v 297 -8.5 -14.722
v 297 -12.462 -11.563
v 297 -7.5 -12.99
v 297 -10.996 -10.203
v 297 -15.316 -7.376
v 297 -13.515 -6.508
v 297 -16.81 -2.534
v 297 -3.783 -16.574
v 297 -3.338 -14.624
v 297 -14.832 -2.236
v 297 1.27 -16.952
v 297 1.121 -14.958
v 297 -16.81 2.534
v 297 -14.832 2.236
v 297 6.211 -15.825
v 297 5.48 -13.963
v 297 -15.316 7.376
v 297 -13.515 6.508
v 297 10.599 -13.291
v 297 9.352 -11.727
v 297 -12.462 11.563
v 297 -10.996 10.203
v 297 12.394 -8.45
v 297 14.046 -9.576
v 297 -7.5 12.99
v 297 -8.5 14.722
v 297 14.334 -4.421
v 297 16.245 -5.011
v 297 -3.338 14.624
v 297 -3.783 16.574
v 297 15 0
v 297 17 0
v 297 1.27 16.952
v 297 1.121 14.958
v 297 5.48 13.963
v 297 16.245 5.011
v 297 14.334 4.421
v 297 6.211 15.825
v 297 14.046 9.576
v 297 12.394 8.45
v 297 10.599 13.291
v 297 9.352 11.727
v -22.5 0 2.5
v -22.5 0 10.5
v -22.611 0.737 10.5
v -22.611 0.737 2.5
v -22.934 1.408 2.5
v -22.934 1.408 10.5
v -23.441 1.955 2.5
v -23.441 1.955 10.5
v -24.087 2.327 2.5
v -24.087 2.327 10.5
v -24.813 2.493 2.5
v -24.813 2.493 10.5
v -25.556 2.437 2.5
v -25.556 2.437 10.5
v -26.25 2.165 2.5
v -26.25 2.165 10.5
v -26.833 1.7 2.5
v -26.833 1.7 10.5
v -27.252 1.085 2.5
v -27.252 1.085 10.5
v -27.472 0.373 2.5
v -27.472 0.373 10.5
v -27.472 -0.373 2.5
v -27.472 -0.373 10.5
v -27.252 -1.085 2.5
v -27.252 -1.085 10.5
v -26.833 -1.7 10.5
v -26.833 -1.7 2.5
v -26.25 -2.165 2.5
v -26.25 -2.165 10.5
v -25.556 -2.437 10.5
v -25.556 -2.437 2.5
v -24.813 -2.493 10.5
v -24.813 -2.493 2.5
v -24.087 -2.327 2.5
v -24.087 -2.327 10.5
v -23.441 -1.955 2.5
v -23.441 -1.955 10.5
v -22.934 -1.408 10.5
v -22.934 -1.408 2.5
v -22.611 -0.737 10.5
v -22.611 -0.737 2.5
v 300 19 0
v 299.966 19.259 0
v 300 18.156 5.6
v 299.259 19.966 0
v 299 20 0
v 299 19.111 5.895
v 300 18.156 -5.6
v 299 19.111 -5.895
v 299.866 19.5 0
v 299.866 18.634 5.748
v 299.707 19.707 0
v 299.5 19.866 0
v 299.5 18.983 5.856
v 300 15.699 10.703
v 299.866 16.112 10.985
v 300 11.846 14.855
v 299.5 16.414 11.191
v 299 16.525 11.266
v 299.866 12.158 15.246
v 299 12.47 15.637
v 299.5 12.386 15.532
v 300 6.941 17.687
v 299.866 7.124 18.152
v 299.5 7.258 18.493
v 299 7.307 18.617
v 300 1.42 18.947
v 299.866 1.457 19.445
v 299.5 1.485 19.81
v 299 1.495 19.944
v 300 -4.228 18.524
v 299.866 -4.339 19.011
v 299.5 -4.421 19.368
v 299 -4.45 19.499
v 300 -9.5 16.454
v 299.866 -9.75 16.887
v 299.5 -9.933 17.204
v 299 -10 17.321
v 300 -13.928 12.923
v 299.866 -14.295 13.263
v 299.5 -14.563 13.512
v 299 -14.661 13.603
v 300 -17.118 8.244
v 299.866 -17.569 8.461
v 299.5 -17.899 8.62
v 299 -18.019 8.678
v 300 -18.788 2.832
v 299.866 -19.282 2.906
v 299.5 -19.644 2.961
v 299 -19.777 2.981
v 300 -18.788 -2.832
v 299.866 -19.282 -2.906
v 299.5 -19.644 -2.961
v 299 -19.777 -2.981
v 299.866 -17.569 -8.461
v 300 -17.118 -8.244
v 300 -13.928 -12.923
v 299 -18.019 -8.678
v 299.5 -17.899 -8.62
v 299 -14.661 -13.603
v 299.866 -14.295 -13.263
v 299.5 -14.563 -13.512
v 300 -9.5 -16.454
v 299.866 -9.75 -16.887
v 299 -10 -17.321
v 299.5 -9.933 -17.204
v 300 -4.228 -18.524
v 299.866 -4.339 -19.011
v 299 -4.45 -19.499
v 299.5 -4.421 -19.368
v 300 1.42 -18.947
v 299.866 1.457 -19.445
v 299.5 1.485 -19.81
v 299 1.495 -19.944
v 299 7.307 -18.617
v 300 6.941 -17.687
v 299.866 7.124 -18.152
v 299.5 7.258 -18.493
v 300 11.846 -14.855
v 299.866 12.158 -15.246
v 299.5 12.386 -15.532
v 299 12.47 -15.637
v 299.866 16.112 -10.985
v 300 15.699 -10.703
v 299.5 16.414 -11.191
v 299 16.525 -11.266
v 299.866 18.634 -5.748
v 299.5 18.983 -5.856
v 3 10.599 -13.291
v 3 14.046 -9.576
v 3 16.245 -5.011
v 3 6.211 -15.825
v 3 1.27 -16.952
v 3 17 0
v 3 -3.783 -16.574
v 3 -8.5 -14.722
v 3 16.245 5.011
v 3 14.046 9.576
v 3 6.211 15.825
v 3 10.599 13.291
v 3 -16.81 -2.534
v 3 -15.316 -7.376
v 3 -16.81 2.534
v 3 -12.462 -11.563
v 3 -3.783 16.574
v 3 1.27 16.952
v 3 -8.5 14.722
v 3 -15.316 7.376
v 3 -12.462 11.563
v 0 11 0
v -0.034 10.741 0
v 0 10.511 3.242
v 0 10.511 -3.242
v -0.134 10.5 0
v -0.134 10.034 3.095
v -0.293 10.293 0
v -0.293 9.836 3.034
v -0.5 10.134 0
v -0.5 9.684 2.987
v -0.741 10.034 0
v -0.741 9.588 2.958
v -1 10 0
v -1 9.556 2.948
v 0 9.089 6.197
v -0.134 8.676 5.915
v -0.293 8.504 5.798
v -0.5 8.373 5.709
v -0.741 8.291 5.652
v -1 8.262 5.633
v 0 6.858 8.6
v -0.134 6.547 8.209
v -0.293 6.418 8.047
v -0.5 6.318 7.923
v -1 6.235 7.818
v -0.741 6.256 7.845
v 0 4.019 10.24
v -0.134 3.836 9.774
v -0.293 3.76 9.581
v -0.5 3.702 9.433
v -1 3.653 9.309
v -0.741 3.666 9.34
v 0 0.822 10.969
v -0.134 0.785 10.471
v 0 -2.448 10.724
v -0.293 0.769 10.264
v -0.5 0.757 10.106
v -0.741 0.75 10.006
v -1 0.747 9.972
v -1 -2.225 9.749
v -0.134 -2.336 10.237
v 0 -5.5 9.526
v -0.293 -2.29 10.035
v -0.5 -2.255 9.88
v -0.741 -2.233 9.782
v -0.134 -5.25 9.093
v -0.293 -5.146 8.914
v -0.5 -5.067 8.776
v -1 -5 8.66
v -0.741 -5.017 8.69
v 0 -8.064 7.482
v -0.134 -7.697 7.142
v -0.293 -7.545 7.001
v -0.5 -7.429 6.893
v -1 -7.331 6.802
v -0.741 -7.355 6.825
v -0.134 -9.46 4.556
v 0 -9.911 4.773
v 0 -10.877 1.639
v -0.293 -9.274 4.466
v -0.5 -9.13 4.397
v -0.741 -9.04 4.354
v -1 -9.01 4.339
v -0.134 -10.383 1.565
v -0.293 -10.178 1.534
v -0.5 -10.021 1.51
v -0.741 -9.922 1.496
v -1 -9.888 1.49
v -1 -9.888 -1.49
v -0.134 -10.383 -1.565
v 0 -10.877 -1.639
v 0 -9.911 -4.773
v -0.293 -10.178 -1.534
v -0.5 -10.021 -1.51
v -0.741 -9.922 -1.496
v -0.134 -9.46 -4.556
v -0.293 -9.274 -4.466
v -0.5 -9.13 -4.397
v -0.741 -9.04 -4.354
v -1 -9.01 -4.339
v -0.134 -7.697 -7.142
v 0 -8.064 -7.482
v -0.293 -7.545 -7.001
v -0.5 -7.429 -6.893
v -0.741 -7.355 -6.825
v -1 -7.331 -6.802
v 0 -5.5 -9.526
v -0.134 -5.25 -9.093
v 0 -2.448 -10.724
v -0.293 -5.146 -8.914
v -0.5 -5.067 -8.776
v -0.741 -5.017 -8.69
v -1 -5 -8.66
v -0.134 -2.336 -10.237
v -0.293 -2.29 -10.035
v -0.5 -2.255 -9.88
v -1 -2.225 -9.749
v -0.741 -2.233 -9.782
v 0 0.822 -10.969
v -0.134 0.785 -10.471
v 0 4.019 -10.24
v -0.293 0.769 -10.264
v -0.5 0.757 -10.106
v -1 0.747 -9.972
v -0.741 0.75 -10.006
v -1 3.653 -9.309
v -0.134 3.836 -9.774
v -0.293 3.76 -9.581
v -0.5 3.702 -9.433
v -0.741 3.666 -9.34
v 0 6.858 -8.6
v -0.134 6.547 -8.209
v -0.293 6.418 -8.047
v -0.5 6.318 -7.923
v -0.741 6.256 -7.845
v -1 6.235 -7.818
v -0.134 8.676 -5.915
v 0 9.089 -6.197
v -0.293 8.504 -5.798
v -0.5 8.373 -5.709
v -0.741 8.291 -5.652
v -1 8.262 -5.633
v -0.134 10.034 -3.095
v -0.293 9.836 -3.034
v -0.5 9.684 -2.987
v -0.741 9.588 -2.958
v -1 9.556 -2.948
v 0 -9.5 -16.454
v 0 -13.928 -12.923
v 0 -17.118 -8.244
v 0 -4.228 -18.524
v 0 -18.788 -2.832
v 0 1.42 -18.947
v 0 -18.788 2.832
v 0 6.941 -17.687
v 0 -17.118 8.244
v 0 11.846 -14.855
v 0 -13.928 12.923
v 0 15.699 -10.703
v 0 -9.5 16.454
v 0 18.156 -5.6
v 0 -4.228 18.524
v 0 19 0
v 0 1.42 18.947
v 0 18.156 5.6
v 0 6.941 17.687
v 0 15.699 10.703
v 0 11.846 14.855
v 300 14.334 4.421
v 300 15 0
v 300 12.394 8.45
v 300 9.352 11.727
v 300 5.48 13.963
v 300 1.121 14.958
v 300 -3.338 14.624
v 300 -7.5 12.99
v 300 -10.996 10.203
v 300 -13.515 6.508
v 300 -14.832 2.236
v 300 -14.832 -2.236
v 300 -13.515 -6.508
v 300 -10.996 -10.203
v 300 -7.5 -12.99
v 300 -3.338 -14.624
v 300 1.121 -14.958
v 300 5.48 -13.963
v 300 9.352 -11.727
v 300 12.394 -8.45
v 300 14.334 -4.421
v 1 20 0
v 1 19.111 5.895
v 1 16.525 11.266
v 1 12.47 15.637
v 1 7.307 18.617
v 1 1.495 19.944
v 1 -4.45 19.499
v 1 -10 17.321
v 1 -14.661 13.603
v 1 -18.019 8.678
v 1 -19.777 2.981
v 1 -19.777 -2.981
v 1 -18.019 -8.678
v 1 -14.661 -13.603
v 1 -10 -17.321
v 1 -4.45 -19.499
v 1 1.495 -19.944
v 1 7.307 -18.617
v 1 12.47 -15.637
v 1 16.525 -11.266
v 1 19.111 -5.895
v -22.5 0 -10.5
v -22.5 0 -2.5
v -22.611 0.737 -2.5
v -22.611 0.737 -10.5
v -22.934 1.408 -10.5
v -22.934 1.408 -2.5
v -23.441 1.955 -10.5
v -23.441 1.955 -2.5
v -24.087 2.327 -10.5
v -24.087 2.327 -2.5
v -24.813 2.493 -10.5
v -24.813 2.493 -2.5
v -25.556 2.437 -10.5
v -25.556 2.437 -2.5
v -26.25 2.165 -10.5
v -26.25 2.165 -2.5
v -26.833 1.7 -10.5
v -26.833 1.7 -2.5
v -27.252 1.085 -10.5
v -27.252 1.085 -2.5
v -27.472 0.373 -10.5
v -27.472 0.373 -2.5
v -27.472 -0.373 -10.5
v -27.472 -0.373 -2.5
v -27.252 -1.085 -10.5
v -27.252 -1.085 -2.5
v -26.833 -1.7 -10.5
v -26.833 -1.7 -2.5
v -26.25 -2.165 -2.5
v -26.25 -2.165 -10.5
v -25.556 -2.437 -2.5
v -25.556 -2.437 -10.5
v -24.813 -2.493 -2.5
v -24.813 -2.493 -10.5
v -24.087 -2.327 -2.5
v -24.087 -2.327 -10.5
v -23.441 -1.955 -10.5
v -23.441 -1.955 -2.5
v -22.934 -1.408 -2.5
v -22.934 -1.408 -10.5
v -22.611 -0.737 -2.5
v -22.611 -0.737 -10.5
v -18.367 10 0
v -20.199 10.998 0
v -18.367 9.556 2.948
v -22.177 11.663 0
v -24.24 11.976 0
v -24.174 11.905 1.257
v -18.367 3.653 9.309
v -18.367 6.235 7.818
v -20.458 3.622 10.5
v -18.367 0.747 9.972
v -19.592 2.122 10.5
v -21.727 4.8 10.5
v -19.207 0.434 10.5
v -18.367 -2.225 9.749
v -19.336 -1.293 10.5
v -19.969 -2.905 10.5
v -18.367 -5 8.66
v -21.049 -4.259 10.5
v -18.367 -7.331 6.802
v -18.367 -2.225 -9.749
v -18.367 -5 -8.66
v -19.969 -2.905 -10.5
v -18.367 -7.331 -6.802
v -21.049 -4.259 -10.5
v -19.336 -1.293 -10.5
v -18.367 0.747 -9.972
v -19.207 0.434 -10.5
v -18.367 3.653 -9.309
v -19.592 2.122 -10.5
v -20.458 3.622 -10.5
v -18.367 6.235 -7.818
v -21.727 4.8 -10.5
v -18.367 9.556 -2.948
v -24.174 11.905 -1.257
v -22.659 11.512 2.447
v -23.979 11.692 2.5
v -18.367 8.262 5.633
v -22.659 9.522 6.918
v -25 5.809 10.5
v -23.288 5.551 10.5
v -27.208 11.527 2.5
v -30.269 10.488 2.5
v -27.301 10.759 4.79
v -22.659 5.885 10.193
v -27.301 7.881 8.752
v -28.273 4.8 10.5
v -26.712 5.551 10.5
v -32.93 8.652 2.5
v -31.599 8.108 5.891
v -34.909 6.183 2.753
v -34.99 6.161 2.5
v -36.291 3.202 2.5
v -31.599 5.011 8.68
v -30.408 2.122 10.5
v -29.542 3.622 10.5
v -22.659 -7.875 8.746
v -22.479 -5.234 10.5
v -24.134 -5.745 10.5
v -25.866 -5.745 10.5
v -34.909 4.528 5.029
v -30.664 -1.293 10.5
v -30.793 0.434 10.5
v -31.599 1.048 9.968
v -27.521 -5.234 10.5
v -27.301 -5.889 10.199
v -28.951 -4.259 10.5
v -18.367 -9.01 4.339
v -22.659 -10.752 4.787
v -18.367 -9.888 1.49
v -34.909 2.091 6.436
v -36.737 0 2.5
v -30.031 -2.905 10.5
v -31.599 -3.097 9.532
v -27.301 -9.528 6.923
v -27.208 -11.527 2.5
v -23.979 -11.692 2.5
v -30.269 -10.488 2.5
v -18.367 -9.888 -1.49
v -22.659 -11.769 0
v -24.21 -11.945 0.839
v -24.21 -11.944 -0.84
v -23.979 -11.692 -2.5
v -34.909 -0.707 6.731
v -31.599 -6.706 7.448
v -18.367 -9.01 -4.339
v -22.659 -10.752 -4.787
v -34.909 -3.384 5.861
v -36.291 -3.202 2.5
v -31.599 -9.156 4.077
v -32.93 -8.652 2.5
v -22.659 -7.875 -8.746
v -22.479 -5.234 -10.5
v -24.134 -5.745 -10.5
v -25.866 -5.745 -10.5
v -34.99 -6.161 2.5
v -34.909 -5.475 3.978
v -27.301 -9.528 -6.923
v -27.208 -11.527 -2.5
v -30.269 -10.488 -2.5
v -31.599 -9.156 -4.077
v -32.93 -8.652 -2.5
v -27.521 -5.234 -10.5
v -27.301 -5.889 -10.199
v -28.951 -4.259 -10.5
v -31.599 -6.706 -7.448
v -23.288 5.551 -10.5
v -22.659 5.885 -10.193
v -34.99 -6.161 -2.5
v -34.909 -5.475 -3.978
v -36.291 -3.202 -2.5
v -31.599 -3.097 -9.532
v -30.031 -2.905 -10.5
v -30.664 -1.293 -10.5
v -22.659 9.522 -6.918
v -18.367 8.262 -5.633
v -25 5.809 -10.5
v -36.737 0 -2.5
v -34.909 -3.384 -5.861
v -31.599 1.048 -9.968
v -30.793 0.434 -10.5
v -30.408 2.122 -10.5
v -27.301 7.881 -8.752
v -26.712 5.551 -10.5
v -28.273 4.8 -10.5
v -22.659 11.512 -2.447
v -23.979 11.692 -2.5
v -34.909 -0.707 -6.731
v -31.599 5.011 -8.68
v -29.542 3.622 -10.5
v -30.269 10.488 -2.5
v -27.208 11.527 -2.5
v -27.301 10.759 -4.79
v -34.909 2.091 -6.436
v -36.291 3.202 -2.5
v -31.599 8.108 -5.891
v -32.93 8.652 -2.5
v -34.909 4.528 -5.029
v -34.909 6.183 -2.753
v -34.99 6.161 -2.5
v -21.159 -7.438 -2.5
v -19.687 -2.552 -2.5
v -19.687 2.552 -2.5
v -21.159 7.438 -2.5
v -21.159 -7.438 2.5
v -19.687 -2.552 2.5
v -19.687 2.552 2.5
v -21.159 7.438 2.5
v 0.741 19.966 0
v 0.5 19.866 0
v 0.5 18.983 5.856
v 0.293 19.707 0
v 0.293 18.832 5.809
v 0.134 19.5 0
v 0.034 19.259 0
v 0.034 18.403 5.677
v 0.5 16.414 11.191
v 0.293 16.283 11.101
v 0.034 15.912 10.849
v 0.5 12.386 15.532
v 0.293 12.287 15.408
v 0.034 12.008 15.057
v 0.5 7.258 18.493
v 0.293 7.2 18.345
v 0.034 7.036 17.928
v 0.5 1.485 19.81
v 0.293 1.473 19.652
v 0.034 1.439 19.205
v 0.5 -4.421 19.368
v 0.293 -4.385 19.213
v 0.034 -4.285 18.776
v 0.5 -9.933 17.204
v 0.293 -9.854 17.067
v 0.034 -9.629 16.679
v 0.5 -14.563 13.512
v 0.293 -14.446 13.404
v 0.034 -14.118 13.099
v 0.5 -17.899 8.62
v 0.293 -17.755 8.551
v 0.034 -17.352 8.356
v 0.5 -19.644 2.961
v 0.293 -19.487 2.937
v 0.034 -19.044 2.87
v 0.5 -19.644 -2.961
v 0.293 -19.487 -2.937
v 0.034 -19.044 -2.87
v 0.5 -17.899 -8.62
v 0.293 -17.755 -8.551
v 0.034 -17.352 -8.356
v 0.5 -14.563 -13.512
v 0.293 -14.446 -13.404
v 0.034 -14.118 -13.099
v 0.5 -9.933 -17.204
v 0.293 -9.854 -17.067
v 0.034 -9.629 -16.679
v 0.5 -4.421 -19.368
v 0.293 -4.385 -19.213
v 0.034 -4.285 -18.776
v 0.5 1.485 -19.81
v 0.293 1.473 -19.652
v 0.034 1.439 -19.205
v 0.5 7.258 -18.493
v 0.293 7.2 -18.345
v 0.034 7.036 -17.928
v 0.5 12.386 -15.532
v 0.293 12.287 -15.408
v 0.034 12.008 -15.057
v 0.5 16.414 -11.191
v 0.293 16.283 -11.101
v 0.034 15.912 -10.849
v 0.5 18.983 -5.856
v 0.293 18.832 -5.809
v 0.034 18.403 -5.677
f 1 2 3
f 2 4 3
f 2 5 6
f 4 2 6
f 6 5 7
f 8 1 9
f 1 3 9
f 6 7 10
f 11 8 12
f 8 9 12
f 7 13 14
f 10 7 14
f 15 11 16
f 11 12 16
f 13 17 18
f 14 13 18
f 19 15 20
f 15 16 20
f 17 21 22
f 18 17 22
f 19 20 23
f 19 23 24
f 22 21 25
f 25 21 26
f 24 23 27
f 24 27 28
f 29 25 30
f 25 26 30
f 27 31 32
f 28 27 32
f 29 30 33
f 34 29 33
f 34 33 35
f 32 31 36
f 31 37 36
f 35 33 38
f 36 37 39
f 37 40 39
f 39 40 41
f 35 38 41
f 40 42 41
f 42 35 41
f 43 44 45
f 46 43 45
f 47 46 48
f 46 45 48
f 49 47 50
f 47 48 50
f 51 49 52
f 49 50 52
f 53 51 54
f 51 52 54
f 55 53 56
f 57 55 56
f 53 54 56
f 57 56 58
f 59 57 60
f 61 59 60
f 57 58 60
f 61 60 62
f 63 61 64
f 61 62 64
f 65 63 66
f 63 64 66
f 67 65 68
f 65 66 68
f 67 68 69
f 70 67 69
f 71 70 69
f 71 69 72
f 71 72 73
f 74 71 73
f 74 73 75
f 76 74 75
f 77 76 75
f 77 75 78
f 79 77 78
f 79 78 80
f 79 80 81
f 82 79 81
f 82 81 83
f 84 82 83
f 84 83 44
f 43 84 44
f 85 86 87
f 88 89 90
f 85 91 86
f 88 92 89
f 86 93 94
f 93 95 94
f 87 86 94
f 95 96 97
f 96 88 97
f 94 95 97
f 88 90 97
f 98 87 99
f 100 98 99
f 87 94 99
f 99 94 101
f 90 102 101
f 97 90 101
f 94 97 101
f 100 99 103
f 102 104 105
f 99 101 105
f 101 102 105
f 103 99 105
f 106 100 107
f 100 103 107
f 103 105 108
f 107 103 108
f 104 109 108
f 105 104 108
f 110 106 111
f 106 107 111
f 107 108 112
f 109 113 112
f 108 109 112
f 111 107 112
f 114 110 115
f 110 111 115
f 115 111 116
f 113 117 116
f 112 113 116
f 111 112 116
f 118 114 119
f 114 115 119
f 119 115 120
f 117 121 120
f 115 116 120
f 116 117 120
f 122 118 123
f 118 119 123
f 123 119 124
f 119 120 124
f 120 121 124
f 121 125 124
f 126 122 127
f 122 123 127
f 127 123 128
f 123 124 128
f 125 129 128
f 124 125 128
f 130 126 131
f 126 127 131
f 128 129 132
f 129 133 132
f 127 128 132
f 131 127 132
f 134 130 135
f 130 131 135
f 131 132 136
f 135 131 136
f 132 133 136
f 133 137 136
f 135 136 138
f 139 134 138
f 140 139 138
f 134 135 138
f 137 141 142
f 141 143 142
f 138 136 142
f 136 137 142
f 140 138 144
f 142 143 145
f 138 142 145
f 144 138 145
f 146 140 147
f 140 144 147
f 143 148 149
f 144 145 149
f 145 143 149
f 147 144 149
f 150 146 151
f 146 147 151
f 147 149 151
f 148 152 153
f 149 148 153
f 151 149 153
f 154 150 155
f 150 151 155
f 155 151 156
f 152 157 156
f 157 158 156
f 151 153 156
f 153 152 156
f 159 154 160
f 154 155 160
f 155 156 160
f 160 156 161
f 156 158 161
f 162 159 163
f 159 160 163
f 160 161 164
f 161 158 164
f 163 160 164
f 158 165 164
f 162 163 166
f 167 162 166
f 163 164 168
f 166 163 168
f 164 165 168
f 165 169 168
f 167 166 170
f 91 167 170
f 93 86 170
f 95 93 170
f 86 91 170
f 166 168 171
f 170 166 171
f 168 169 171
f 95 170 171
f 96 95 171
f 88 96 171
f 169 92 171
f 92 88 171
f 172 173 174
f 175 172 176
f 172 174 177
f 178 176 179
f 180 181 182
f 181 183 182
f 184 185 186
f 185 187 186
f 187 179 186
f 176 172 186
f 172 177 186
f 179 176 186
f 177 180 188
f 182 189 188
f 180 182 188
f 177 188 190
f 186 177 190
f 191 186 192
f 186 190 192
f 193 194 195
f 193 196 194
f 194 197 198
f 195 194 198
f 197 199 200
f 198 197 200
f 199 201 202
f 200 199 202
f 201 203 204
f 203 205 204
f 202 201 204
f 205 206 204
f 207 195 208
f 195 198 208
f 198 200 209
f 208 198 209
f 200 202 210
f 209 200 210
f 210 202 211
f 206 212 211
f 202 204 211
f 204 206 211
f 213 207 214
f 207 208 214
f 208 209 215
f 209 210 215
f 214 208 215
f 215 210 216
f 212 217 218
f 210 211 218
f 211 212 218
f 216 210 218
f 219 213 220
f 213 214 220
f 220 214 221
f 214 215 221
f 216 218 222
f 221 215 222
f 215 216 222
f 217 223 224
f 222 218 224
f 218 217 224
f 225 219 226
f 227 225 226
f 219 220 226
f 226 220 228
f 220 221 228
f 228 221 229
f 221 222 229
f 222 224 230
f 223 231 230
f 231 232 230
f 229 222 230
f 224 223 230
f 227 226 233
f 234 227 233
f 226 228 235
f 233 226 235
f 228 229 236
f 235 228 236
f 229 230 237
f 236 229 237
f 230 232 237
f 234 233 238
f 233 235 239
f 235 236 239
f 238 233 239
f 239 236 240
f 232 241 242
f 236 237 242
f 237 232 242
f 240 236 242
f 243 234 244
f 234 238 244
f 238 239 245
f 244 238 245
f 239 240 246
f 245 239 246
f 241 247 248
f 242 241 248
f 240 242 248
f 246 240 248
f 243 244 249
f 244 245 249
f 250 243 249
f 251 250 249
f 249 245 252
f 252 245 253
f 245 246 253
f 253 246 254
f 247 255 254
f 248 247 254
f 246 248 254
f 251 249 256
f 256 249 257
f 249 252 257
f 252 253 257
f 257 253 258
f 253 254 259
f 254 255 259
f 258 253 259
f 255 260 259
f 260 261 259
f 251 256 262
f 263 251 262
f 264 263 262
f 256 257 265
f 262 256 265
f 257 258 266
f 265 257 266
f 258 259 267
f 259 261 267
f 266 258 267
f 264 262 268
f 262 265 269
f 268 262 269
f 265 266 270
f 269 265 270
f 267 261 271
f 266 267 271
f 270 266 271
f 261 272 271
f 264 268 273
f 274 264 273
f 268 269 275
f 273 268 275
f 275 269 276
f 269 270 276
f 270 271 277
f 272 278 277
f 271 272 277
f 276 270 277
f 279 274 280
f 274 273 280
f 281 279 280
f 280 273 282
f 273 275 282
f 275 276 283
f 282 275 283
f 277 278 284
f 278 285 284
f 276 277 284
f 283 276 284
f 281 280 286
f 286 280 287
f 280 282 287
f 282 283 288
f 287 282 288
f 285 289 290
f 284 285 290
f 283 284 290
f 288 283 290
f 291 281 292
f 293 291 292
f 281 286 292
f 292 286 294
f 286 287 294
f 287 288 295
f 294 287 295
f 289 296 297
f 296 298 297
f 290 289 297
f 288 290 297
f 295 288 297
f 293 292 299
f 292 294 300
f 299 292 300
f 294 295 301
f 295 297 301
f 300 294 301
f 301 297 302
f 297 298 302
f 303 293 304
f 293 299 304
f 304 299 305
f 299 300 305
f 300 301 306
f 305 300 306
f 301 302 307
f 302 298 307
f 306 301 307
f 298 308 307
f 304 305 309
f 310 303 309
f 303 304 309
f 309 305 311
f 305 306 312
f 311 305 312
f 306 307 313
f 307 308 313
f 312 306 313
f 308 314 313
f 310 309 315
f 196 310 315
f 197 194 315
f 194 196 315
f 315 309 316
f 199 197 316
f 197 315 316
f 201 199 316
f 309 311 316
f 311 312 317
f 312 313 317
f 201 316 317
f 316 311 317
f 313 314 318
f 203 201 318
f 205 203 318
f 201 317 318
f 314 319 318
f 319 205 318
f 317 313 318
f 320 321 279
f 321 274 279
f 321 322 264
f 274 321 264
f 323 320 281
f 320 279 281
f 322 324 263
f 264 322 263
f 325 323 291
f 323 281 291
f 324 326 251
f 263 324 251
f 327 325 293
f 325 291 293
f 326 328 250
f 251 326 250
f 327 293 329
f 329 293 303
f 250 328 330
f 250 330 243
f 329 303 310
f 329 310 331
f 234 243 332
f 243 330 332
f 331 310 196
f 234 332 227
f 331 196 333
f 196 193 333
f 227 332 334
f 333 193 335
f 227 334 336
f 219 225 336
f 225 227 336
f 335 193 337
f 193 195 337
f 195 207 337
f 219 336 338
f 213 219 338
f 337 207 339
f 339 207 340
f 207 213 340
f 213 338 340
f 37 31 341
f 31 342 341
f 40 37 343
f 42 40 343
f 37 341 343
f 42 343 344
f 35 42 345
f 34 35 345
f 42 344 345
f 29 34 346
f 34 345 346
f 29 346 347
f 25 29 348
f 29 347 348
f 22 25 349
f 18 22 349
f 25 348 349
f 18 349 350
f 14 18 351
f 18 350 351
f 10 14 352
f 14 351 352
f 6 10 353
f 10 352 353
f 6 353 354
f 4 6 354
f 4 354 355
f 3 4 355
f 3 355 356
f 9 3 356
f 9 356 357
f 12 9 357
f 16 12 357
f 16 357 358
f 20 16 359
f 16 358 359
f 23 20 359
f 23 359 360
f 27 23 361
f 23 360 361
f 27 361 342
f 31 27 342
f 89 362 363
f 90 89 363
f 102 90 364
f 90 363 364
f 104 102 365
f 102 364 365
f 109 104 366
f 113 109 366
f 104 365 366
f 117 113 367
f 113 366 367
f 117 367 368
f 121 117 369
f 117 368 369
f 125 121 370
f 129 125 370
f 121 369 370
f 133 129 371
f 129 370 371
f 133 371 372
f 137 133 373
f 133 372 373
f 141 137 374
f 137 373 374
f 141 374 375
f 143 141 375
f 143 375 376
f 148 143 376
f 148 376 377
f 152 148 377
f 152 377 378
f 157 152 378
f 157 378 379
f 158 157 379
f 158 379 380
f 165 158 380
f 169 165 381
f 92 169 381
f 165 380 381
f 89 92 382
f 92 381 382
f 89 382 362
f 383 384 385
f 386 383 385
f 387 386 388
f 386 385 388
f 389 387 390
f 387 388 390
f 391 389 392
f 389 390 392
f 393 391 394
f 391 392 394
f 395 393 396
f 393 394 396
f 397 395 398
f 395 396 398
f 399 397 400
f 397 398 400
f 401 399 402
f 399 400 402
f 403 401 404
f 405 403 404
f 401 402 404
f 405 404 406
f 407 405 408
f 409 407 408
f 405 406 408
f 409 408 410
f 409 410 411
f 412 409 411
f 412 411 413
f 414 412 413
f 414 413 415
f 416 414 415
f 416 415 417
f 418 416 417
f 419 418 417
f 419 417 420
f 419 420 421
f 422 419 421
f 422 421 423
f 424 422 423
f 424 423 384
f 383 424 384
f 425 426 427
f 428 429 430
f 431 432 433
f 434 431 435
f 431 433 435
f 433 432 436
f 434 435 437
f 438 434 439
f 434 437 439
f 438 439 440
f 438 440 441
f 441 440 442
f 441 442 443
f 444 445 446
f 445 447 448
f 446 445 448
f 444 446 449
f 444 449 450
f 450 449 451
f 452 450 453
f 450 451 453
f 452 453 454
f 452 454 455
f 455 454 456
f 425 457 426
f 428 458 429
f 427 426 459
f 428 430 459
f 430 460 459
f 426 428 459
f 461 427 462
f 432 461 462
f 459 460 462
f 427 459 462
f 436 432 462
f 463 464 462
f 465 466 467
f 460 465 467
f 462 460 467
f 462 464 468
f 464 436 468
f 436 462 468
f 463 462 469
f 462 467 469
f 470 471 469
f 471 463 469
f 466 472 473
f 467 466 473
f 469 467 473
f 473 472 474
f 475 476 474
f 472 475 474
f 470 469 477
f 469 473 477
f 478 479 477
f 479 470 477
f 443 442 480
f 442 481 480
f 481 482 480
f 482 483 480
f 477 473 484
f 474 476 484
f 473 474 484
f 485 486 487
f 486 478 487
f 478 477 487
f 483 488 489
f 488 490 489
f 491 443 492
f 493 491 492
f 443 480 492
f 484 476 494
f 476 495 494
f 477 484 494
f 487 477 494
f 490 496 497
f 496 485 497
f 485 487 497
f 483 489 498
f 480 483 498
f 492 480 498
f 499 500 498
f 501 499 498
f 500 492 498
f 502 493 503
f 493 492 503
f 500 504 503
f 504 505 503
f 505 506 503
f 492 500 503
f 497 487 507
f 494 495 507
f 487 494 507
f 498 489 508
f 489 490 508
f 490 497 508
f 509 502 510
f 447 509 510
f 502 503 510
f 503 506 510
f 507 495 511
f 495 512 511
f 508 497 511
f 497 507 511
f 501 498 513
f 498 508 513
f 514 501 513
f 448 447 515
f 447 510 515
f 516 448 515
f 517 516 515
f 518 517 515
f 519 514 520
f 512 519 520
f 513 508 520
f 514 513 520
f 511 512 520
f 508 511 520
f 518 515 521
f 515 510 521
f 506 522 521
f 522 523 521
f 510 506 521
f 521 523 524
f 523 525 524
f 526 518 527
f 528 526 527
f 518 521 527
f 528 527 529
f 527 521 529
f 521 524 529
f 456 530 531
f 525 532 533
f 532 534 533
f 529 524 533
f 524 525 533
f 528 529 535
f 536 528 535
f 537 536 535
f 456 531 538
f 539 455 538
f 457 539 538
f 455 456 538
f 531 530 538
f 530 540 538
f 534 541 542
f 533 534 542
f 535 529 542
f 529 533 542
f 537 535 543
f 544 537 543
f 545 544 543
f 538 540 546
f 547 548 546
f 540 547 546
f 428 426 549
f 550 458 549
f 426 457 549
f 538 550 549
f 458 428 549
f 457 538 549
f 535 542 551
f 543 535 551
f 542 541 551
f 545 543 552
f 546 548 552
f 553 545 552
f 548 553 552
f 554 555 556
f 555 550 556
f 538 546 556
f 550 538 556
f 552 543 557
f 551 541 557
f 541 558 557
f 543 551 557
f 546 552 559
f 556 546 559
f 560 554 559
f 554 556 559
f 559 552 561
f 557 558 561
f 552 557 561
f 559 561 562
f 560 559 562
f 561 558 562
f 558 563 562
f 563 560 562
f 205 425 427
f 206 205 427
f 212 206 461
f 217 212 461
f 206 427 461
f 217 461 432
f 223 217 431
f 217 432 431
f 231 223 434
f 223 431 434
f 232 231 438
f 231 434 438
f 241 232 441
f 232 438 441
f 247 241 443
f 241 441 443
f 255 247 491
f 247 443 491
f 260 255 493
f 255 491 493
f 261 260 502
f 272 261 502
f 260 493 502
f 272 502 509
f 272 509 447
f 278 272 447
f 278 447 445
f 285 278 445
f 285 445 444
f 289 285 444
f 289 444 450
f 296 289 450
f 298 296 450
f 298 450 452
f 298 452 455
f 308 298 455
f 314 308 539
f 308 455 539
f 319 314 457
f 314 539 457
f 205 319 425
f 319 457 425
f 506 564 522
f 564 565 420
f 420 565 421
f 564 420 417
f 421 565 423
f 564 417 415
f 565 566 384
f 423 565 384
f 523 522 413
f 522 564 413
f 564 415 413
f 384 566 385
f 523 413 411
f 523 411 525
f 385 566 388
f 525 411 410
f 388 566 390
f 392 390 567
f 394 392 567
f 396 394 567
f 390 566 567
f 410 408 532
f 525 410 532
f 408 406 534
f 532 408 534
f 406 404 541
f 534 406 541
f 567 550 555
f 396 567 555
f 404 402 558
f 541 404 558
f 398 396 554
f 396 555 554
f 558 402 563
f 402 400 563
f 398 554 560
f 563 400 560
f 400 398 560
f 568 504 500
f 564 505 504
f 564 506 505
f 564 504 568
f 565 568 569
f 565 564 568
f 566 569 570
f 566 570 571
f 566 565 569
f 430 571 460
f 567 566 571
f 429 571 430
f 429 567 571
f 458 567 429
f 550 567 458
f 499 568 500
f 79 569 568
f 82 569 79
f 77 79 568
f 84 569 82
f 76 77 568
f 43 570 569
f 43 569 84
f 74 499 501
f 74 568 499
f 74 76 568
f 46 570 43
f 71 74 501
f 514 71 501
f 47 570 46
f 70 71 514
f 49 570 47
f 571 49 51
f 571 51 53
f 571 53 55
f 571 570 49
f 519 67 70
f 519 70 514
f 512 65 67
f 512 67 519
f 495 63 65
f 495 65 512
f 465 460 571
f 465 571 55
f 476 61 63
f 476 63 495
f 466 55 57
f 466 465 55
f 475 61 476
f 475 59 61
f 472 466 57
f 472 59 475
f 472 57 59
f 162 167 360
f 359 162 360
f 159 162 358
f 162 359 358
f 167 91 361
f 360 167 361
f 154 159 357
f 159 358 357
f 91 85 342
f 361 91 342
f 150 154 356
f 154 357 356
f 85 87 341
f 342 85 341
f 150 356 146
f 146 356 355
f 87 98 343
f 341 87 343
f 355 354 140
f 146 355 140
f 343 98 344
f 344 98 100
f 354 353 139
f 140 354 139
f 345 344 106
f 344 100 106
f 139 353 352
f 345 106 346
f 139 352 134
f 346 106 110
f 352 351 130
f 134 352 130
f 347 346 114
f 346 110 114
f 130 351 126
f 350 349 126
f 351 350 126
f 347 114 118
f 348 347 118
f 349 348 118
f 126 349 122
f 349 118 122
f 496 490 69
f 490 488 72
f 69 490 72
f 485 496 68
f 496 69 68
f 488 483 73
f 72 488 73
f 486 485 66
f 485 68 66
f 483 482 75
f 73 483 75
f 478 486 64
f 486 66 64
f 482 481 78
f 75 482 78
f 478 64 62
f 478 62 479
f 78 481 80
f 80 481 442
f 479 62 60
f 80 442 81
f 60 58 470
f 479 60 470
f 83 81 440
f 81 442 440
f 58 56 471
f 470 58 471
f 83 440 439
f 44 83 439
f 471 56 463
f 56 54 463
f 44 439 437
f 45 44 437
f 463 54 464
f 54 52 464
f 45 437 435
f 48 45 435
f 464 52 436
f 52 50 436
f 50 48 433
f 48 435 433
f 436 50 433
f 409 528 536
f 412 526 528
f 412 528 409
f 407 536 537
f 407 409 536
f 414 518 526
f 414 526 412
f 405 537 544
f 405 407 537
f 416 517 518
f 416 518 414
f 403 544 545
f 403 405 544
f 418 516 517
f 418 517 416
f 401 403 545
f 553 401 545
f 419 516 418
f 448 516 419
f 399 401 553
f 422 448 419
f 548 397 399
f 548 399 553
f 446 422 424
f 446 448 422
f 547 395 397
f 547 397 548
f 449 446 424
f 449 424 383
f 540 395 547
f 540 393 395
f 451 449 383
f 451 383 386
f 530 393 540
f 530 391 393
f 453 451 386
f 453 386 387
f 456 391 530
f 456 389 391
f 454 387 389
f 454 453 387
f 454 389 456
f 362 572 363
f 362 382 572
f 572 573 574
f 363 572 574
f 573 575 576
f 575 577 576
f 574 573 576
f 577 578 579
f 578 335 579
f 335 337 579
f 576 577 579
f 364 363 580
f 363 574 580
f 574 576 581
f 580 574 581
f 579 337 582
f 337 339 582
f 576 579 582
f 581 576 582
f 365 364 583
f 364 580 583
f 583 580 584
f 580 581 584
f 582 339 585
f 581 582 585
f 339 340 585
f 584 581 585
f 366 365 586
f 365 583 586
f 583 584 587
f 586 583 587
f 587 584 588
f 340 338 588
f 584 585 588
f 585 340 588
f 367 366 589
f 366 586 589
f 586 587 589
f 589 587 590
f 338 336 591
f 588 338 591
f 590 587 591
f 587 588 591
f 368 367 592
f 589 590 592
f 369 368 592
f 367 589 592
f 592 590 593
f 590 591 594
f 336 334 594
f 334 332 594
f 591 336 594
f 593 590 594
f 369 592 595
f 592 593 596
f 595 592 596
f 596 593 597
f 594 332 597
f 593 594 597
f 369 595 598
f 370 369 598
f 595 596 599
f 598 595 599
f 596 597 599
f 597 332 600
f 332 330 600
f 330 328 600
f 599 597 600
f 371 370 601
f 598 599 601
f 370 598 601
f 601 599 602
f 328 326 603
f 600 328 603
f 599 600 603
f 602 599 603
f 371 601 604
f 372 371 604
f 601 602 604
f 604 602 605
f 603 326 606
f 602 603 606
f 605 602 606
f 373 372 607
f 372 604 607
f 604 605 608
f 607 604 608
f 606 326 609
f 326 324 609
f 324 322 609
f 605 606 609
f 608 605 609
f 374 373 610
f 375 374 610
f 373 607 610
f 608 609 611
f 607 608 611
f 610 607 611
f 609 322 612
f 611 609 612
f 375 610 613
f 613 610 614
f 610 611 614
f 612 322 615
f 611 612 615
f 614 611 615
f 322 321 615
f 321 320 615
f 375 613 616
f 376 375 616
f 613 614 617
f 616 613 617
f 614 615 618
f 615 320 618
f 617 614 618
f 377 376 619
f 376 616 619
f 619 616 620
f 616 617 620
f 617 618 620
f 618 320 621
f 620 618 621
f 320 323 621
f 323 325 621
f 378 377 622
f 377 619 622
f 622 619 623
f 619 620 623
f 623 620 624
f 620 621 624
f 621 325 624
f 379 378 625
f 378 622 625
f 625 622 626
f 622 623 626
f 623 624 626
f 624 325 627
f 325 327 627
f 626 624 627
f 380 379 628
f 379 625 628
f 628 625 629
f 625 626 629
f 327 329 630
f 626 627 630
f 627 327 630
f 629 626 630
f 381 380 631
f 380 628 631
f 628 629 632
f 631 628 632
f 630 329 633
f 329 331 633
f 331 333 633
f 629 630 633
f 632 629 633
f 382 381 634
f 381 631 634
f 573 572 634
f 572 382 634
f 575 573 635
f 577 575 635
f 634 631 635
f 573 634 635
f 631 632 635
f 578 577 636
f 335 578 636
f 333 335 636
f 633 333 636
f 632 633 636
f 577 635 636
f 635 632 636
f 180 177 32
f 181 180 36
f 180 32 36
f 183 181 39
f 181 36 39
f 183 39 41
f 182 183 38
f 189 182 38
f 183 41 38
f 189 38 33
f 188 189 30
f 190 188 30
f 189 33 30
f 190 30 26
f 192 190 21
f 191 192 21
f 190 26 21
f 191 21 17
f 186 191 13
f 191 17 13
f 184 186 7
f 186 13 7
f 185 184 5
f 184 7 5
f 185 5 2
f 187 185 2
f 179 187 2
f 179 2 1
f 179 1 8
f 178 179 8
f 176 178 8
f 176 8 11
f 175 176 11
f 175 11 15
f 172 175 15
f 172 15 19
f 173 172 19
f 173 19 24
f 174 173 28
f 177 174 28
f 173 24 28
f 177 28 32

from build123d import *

# Parameters (mm, degrees)
SKETCH6_OUTSIDE_W       = 110.342
SKETCH6_OUTSIDE_H       = 110.342
SKETCH6_OUTSIDE_W_2     = 21
SKETCH6_OUTSIDE_H_2     = 30
CUT_EXTRUDE3_DEPTH      = 40
SKETCH4_W               = 17.5
SKETCH4_H               = 5
FILLET1_R               = 1
SKETCH8_R               = 2.5
CUT_EXTRUDE4_DEPTH      = 10.5
CUT_EXTRUDE4_DEPTH_BACK = 31.5


with BuildPart() as part:
    # Sketch1 → Revolve1 (revolve)
    with BuildSketch(Plane.XY):
        with BuildLine():
            Line((297, 15), (300, 15))
            Line((300, 15), (300, 20))
            Line((300, 20), (0, 20))
            Line((0, 20), (0, 10))
            Line((0, 10), (-18.366750419, 10))
            ThreePointArc((-18.366750419, 10), (-30.674548662, 10.573528147), (-37, 0))
            Line((-37, 0), (0, 0))
            Line((0, 0), (3, 0))
            Line((3, 0), (3, 17))
            Line((3, 17), (297, 17))
            Line((297, 17), (297, 15))
        make_face()
    revolve(axis=Axis((0, 0, 0), (1, 0, 0)))

    # Sketch6 outside → Cut-Extrude3 (cut)
    with BuildSketch(Plane.ZY):
        Rectangle(SKETCH6_OUTSIDE_W, SKETCH6_OUTSIDE_H)
        Rectangle(SKETCH6_OUTSIDE_W_2, SKETCH6_OUTSIDE_H_2, mode=Mode.SUBTRACT)
    extrude(amount=CUT_EXTRUDE3_DEPTH, mode=Mode.SUBTRACT)

    # Sketch4 → Cut-Revolve1 (revolve, cut)
    with BuildSketch(Plane(origin=(0, 0, 0), x_dir=(1, 0, 0), z_dir=(0, 1, 0))):
        with Locations((-28.25, 0)):
            Rectangle(SKETCH4_W, SKETCH4_H)
    revolve(axis=Axis((-37, 0, -2.5), (0, 0, 1)), mode=Mode.SUBTRACT)

    # Fillet1
    fillet1_edges = [part.edges().sort_by_distance(p)[0] for p in [
        (300, -20, 0),
        (0, -10, 0),
        (0, -20, 0),
    ]]
    fillet(fillet1_edges, radius=FILLET1_R)

    # Sketch8 → Cut-Extrude4 (cut, two sides)
    with BuildSketch(Plane.XY.offset(10.5)) as cut_extrude4_sk:
        with Locations((-25, 0)):
            Circle(SKETCH8_R)
    extrude(amount=CUT_EXTRUDE4_DEPTH, mode=Mode.SUBTRACT)
    extrude(cut_extrude4_sk.sketch, amount=-CUT_EXTRUDE4_DEPTH_BACK, mode=Mode.SUBTRACT)


solid = part.part
